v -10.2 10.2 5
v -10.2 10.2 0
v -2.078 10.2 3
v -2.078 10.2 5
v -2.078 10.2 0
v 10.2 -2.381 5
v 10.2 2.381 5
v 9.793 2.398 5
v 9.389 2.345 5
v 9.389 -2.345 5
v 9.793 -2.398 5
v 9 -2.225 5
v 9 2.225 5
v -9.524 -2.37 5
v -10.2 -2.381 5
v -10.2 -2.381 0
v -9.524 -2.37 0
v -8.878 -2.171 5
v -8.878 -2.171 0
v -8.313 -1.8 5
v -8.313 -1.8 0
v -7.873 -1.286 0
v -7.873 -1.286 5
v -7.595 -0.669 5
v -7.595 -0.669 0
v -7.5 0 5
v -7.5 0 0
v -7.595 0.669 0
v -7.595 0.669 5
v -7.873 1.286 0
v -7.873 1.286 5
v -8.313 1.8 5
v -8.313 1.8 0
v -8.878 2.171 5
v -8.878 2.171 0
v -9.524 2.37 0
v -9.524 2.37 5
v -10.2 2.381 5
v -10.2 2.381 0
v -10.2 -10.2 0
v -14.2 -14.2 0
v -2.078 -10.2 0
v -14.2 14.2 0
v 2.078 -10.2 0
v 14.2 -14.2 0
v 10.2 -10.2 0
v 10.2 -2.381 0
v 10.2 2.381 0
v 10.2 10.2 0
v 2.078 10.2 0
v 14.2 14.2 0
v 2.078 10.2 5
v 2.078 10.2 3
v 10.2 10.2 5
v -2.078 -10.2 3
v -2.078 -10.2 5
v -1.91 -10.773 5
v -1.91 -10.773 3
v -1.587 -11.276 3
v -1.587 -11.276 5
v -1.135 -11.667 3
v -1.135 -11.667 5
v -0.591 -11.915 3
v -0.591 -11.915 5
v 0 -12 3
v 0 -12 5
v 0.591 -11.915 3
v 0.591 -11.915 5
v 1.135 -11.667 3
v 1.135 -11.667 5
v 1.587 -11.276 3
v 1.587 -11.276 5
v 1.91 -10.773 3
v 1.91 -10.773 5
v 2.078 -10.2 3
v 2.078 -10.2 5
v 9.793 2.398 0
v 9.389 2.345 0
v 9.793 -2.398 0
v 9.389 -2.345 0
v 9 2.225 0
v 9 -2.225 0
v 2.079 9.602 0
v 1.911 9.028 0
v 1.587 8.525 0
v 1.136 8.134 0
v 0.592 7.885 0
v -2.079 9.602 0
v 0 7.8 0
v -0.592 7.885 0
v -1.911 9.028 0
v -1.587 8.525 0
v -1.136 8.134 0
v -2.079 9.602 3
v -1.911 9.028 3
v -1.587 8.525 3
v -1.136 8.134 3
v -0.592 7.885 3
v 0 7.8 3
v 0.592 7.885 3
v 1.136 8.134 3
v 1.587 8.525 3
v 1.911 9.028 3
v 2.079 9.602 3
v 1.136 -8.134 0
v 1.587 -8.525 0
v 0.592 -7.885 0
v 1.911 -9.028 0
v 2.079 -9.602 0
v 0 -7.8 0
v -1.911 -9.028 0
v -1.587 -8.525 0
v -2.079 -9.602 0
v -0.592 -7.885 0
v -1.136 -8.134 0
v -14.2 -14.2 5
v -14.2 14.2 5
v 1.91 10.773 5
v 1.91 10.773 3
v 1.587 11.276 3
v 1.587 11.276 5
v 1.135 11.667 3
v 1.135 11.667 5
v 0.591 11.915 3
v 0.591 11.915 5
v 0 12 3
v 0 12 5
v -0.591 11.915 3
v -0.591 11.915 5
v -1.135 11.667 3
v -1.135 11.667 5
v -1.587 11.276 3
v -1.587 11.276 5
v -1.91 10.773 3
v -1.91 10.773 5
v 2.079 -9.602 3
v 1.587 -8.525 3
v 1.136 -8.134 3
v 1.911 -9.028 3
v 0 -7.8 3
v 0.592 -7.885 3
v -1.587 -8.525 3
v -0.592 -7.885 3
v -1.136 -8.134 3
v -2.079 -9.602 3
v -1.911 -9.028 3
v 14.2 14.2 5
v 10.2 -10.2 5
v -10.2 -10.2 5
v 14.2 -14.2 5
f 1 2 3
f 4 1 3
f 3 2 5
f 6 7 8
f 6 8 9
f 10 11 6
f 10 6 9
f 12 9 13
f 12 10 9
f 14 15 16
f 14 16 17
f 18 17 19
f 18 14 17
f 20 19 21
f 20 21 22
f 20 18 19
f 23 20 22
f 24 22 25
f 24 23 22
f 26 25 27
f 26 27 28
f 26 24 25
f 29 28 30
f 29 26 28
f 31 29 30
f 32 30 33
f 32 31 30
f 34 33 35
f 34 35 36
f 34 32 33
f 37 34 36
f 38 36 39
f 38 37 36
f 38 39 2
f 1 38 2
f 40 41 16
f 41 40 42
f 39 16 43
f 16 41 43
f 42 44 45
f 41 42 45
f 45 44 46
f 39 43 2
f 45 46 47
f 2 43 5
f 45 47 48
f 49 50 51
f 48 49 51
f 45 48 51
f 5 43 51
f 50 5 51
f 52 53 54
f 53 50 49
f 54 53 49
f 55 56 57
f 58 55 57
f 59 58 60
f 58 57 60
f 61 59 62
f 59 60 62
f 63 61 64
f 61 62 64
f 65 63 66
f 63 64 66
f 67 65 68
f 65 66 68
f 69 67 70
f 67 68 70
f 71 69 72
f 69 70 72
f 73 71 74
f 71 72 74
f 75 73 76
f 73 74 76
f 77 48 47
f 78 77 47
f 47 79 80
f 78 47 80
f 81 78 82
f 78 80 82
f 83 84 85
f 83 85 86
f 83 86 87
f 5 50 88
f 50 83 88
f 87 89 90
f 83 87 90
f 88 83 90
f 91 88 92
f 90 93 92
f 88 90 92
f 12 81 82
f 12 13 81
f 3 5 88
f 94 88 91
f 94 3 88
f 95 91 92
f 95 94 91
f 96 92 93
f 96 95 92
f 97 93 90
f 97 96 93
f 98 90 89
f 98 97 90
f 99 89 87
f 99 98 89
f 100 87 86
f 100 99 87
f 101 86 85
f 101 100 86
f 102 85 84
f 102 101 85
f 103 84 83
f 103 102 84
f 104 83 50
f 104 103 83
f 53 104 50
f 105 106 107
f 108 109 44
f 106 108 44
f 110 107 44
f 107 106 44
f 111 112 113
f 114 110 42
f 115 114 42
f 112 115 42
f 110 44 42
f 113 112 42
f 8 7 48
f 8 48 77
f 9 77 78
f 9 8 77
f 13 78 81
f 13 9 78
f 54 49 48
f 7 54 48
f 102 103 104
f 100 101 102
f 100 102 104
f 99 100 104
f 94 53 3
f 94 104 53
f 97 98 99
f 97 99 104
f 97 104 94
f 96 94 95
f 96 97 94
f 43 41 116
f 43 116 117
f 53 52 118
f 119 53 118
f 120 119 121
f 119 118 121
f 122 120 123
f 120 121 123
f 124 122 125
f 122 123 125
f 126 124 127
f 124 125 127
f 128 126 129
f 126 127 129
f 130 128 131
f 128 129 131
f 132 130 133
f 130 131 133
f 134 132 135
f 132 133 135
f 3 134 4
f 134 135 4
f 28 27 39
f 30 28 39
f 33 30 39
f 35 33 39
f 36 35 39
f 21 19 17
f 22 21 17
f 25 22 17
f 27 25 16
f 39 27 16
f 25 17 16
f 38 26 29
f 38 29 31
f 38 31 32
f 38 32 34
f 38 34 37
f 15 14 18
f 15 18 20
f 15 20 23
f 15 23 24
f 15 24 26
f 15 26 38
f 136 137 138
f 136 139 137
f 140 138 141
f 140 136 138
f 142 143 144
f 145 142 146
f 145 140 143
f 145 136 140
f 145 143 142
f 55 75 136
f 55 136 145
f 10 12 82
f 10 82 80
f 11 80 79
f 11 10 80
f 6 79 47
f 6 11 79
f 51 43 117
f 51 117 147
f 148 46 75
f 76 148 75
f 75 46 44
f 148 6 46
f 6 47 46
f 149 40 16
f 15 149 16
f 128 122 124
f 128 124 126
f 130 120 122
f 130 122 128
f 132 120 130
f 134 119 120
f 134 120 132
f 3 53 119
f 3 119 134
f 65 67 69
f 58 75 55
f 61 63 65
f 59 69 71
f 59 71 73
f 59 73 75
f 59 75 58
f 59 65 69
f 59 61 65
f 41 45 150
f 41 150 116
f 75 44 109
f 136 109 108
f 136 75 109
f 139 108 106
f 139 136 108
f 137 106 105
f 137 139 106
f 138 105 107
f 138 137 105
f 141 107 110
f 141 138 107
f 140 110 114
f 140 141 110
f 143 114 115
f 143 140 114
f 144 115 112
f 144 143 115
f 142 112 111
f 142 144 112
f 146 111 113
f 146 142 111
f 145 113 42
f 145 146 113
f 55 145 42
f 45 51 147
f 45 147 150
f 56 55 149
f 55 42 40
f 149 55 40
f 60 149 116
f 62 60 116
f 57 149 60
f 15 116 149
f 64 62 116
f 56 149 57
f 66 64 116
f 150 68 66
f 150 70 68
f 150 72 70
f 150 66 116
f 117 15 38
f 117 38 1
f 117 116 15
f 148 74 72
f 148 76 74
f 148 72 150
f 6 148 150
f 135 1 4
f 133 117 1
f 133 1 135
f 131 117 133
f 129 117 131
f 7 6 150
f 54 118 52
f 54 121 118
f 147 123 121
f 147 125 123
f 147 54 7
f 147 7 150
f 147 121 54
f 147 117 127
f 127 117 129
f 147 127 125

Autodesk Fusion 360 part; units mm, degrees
sketch "Sketch1" plane through (0, 0, 0) normal (0, 0, 1) x (1, 0, 0)
  line L0 (14.2, -14.2) -> (-14.2, -14.2)
  line L1 (-14.2, -14.2) -> (-14.2, 14.2)
  line L2 (-14.2, 14.2) -> (14.2, 14.2)
  line L3 (14.2, 14.2) -> (14.2, -14.2)
  line L4 (14.2, -14.2) -> (-14.2, 14.2) construction
  line L5 (-14.2, -14.2) -> (14.2, 14.2) construction
  dimension "d1" = 28.4
  dimension "d2" = 28.4
extrude "Extrude1" add sketch "Sketch1" along normal blind 5
shell "Shell1" thickness 4 removed faces 2 at (-4.7333, 4.7333, 5) at (-4.7333, 4.7333, 0)
sketch "Sketch2" plane through (0, 0, 5) normal (0, 0, 1) x (-1, 0, 0)
  line L0 (-10.2, -10.2) -> (-10.2, 10.2)
  line L1 (-10.2, 10.2) -> (10.2, 10.2)
  line L2 (10.2, 10.2) -> (10.2, -10.2)
  line L3 (10.2, -10.2) -> (-10.2, -10.2)
  line L4 (-14.2, -14.2) -> (14.2, -14.2)
  line L5 (14.2, -14.2) -> (14.2, 14.2)
  line L6 (14.2, 14.2) -> (-14.2, 14.2)
  line L7 (-14.2, 14.2) -> (-14.2, -14.2)
  circle A0 centre (0, -9.9) radius 2.1
  circle A1 centre (-9.9, 0) radius 2.4
  line L8 (-10.2, 0) -> (10.2, 0) construction
  line L9 (0, -10.2) -> (0, 10.2) construction
  circle A2 centre (0, 9.9) radius 2.1
  circle A3 centre (9.9, 0) radius 2.4
  line L10 (-9, -2.2249) -> (-9, 2.2249)
  dimension "d11" = 4.2
  dimension "d12" = 0.3
  dimension "d14" = 4.8
  dimension "d15" = 0.3
  dimension "d18" = 4.2
  dimension "d19" = 0.3
  dimension "d21" = 4.8
  dimension "d31" = 0.3
  dimension "d33" = 0.9
extrude "Extrude2" add sketch "Sketch2" against normal blind 5 contours L0 A1 L10 | L2 A3 picked at (9.4042, -0.3949)
extrude "Extrude3" cut sketch "Sketch2" against normal blind 2 contours L3 A0 | L1 A2 picked at (0.357, -10.7865) picked at (0.0996, 10.7929)
extrude "Extrude4" add sketch "Sketch2" against normal blind 3 from surface at -2 contours L3 A0 | L1 A2 picked at (0.2572, -9.449) picked at (0.2572, 9.449)
